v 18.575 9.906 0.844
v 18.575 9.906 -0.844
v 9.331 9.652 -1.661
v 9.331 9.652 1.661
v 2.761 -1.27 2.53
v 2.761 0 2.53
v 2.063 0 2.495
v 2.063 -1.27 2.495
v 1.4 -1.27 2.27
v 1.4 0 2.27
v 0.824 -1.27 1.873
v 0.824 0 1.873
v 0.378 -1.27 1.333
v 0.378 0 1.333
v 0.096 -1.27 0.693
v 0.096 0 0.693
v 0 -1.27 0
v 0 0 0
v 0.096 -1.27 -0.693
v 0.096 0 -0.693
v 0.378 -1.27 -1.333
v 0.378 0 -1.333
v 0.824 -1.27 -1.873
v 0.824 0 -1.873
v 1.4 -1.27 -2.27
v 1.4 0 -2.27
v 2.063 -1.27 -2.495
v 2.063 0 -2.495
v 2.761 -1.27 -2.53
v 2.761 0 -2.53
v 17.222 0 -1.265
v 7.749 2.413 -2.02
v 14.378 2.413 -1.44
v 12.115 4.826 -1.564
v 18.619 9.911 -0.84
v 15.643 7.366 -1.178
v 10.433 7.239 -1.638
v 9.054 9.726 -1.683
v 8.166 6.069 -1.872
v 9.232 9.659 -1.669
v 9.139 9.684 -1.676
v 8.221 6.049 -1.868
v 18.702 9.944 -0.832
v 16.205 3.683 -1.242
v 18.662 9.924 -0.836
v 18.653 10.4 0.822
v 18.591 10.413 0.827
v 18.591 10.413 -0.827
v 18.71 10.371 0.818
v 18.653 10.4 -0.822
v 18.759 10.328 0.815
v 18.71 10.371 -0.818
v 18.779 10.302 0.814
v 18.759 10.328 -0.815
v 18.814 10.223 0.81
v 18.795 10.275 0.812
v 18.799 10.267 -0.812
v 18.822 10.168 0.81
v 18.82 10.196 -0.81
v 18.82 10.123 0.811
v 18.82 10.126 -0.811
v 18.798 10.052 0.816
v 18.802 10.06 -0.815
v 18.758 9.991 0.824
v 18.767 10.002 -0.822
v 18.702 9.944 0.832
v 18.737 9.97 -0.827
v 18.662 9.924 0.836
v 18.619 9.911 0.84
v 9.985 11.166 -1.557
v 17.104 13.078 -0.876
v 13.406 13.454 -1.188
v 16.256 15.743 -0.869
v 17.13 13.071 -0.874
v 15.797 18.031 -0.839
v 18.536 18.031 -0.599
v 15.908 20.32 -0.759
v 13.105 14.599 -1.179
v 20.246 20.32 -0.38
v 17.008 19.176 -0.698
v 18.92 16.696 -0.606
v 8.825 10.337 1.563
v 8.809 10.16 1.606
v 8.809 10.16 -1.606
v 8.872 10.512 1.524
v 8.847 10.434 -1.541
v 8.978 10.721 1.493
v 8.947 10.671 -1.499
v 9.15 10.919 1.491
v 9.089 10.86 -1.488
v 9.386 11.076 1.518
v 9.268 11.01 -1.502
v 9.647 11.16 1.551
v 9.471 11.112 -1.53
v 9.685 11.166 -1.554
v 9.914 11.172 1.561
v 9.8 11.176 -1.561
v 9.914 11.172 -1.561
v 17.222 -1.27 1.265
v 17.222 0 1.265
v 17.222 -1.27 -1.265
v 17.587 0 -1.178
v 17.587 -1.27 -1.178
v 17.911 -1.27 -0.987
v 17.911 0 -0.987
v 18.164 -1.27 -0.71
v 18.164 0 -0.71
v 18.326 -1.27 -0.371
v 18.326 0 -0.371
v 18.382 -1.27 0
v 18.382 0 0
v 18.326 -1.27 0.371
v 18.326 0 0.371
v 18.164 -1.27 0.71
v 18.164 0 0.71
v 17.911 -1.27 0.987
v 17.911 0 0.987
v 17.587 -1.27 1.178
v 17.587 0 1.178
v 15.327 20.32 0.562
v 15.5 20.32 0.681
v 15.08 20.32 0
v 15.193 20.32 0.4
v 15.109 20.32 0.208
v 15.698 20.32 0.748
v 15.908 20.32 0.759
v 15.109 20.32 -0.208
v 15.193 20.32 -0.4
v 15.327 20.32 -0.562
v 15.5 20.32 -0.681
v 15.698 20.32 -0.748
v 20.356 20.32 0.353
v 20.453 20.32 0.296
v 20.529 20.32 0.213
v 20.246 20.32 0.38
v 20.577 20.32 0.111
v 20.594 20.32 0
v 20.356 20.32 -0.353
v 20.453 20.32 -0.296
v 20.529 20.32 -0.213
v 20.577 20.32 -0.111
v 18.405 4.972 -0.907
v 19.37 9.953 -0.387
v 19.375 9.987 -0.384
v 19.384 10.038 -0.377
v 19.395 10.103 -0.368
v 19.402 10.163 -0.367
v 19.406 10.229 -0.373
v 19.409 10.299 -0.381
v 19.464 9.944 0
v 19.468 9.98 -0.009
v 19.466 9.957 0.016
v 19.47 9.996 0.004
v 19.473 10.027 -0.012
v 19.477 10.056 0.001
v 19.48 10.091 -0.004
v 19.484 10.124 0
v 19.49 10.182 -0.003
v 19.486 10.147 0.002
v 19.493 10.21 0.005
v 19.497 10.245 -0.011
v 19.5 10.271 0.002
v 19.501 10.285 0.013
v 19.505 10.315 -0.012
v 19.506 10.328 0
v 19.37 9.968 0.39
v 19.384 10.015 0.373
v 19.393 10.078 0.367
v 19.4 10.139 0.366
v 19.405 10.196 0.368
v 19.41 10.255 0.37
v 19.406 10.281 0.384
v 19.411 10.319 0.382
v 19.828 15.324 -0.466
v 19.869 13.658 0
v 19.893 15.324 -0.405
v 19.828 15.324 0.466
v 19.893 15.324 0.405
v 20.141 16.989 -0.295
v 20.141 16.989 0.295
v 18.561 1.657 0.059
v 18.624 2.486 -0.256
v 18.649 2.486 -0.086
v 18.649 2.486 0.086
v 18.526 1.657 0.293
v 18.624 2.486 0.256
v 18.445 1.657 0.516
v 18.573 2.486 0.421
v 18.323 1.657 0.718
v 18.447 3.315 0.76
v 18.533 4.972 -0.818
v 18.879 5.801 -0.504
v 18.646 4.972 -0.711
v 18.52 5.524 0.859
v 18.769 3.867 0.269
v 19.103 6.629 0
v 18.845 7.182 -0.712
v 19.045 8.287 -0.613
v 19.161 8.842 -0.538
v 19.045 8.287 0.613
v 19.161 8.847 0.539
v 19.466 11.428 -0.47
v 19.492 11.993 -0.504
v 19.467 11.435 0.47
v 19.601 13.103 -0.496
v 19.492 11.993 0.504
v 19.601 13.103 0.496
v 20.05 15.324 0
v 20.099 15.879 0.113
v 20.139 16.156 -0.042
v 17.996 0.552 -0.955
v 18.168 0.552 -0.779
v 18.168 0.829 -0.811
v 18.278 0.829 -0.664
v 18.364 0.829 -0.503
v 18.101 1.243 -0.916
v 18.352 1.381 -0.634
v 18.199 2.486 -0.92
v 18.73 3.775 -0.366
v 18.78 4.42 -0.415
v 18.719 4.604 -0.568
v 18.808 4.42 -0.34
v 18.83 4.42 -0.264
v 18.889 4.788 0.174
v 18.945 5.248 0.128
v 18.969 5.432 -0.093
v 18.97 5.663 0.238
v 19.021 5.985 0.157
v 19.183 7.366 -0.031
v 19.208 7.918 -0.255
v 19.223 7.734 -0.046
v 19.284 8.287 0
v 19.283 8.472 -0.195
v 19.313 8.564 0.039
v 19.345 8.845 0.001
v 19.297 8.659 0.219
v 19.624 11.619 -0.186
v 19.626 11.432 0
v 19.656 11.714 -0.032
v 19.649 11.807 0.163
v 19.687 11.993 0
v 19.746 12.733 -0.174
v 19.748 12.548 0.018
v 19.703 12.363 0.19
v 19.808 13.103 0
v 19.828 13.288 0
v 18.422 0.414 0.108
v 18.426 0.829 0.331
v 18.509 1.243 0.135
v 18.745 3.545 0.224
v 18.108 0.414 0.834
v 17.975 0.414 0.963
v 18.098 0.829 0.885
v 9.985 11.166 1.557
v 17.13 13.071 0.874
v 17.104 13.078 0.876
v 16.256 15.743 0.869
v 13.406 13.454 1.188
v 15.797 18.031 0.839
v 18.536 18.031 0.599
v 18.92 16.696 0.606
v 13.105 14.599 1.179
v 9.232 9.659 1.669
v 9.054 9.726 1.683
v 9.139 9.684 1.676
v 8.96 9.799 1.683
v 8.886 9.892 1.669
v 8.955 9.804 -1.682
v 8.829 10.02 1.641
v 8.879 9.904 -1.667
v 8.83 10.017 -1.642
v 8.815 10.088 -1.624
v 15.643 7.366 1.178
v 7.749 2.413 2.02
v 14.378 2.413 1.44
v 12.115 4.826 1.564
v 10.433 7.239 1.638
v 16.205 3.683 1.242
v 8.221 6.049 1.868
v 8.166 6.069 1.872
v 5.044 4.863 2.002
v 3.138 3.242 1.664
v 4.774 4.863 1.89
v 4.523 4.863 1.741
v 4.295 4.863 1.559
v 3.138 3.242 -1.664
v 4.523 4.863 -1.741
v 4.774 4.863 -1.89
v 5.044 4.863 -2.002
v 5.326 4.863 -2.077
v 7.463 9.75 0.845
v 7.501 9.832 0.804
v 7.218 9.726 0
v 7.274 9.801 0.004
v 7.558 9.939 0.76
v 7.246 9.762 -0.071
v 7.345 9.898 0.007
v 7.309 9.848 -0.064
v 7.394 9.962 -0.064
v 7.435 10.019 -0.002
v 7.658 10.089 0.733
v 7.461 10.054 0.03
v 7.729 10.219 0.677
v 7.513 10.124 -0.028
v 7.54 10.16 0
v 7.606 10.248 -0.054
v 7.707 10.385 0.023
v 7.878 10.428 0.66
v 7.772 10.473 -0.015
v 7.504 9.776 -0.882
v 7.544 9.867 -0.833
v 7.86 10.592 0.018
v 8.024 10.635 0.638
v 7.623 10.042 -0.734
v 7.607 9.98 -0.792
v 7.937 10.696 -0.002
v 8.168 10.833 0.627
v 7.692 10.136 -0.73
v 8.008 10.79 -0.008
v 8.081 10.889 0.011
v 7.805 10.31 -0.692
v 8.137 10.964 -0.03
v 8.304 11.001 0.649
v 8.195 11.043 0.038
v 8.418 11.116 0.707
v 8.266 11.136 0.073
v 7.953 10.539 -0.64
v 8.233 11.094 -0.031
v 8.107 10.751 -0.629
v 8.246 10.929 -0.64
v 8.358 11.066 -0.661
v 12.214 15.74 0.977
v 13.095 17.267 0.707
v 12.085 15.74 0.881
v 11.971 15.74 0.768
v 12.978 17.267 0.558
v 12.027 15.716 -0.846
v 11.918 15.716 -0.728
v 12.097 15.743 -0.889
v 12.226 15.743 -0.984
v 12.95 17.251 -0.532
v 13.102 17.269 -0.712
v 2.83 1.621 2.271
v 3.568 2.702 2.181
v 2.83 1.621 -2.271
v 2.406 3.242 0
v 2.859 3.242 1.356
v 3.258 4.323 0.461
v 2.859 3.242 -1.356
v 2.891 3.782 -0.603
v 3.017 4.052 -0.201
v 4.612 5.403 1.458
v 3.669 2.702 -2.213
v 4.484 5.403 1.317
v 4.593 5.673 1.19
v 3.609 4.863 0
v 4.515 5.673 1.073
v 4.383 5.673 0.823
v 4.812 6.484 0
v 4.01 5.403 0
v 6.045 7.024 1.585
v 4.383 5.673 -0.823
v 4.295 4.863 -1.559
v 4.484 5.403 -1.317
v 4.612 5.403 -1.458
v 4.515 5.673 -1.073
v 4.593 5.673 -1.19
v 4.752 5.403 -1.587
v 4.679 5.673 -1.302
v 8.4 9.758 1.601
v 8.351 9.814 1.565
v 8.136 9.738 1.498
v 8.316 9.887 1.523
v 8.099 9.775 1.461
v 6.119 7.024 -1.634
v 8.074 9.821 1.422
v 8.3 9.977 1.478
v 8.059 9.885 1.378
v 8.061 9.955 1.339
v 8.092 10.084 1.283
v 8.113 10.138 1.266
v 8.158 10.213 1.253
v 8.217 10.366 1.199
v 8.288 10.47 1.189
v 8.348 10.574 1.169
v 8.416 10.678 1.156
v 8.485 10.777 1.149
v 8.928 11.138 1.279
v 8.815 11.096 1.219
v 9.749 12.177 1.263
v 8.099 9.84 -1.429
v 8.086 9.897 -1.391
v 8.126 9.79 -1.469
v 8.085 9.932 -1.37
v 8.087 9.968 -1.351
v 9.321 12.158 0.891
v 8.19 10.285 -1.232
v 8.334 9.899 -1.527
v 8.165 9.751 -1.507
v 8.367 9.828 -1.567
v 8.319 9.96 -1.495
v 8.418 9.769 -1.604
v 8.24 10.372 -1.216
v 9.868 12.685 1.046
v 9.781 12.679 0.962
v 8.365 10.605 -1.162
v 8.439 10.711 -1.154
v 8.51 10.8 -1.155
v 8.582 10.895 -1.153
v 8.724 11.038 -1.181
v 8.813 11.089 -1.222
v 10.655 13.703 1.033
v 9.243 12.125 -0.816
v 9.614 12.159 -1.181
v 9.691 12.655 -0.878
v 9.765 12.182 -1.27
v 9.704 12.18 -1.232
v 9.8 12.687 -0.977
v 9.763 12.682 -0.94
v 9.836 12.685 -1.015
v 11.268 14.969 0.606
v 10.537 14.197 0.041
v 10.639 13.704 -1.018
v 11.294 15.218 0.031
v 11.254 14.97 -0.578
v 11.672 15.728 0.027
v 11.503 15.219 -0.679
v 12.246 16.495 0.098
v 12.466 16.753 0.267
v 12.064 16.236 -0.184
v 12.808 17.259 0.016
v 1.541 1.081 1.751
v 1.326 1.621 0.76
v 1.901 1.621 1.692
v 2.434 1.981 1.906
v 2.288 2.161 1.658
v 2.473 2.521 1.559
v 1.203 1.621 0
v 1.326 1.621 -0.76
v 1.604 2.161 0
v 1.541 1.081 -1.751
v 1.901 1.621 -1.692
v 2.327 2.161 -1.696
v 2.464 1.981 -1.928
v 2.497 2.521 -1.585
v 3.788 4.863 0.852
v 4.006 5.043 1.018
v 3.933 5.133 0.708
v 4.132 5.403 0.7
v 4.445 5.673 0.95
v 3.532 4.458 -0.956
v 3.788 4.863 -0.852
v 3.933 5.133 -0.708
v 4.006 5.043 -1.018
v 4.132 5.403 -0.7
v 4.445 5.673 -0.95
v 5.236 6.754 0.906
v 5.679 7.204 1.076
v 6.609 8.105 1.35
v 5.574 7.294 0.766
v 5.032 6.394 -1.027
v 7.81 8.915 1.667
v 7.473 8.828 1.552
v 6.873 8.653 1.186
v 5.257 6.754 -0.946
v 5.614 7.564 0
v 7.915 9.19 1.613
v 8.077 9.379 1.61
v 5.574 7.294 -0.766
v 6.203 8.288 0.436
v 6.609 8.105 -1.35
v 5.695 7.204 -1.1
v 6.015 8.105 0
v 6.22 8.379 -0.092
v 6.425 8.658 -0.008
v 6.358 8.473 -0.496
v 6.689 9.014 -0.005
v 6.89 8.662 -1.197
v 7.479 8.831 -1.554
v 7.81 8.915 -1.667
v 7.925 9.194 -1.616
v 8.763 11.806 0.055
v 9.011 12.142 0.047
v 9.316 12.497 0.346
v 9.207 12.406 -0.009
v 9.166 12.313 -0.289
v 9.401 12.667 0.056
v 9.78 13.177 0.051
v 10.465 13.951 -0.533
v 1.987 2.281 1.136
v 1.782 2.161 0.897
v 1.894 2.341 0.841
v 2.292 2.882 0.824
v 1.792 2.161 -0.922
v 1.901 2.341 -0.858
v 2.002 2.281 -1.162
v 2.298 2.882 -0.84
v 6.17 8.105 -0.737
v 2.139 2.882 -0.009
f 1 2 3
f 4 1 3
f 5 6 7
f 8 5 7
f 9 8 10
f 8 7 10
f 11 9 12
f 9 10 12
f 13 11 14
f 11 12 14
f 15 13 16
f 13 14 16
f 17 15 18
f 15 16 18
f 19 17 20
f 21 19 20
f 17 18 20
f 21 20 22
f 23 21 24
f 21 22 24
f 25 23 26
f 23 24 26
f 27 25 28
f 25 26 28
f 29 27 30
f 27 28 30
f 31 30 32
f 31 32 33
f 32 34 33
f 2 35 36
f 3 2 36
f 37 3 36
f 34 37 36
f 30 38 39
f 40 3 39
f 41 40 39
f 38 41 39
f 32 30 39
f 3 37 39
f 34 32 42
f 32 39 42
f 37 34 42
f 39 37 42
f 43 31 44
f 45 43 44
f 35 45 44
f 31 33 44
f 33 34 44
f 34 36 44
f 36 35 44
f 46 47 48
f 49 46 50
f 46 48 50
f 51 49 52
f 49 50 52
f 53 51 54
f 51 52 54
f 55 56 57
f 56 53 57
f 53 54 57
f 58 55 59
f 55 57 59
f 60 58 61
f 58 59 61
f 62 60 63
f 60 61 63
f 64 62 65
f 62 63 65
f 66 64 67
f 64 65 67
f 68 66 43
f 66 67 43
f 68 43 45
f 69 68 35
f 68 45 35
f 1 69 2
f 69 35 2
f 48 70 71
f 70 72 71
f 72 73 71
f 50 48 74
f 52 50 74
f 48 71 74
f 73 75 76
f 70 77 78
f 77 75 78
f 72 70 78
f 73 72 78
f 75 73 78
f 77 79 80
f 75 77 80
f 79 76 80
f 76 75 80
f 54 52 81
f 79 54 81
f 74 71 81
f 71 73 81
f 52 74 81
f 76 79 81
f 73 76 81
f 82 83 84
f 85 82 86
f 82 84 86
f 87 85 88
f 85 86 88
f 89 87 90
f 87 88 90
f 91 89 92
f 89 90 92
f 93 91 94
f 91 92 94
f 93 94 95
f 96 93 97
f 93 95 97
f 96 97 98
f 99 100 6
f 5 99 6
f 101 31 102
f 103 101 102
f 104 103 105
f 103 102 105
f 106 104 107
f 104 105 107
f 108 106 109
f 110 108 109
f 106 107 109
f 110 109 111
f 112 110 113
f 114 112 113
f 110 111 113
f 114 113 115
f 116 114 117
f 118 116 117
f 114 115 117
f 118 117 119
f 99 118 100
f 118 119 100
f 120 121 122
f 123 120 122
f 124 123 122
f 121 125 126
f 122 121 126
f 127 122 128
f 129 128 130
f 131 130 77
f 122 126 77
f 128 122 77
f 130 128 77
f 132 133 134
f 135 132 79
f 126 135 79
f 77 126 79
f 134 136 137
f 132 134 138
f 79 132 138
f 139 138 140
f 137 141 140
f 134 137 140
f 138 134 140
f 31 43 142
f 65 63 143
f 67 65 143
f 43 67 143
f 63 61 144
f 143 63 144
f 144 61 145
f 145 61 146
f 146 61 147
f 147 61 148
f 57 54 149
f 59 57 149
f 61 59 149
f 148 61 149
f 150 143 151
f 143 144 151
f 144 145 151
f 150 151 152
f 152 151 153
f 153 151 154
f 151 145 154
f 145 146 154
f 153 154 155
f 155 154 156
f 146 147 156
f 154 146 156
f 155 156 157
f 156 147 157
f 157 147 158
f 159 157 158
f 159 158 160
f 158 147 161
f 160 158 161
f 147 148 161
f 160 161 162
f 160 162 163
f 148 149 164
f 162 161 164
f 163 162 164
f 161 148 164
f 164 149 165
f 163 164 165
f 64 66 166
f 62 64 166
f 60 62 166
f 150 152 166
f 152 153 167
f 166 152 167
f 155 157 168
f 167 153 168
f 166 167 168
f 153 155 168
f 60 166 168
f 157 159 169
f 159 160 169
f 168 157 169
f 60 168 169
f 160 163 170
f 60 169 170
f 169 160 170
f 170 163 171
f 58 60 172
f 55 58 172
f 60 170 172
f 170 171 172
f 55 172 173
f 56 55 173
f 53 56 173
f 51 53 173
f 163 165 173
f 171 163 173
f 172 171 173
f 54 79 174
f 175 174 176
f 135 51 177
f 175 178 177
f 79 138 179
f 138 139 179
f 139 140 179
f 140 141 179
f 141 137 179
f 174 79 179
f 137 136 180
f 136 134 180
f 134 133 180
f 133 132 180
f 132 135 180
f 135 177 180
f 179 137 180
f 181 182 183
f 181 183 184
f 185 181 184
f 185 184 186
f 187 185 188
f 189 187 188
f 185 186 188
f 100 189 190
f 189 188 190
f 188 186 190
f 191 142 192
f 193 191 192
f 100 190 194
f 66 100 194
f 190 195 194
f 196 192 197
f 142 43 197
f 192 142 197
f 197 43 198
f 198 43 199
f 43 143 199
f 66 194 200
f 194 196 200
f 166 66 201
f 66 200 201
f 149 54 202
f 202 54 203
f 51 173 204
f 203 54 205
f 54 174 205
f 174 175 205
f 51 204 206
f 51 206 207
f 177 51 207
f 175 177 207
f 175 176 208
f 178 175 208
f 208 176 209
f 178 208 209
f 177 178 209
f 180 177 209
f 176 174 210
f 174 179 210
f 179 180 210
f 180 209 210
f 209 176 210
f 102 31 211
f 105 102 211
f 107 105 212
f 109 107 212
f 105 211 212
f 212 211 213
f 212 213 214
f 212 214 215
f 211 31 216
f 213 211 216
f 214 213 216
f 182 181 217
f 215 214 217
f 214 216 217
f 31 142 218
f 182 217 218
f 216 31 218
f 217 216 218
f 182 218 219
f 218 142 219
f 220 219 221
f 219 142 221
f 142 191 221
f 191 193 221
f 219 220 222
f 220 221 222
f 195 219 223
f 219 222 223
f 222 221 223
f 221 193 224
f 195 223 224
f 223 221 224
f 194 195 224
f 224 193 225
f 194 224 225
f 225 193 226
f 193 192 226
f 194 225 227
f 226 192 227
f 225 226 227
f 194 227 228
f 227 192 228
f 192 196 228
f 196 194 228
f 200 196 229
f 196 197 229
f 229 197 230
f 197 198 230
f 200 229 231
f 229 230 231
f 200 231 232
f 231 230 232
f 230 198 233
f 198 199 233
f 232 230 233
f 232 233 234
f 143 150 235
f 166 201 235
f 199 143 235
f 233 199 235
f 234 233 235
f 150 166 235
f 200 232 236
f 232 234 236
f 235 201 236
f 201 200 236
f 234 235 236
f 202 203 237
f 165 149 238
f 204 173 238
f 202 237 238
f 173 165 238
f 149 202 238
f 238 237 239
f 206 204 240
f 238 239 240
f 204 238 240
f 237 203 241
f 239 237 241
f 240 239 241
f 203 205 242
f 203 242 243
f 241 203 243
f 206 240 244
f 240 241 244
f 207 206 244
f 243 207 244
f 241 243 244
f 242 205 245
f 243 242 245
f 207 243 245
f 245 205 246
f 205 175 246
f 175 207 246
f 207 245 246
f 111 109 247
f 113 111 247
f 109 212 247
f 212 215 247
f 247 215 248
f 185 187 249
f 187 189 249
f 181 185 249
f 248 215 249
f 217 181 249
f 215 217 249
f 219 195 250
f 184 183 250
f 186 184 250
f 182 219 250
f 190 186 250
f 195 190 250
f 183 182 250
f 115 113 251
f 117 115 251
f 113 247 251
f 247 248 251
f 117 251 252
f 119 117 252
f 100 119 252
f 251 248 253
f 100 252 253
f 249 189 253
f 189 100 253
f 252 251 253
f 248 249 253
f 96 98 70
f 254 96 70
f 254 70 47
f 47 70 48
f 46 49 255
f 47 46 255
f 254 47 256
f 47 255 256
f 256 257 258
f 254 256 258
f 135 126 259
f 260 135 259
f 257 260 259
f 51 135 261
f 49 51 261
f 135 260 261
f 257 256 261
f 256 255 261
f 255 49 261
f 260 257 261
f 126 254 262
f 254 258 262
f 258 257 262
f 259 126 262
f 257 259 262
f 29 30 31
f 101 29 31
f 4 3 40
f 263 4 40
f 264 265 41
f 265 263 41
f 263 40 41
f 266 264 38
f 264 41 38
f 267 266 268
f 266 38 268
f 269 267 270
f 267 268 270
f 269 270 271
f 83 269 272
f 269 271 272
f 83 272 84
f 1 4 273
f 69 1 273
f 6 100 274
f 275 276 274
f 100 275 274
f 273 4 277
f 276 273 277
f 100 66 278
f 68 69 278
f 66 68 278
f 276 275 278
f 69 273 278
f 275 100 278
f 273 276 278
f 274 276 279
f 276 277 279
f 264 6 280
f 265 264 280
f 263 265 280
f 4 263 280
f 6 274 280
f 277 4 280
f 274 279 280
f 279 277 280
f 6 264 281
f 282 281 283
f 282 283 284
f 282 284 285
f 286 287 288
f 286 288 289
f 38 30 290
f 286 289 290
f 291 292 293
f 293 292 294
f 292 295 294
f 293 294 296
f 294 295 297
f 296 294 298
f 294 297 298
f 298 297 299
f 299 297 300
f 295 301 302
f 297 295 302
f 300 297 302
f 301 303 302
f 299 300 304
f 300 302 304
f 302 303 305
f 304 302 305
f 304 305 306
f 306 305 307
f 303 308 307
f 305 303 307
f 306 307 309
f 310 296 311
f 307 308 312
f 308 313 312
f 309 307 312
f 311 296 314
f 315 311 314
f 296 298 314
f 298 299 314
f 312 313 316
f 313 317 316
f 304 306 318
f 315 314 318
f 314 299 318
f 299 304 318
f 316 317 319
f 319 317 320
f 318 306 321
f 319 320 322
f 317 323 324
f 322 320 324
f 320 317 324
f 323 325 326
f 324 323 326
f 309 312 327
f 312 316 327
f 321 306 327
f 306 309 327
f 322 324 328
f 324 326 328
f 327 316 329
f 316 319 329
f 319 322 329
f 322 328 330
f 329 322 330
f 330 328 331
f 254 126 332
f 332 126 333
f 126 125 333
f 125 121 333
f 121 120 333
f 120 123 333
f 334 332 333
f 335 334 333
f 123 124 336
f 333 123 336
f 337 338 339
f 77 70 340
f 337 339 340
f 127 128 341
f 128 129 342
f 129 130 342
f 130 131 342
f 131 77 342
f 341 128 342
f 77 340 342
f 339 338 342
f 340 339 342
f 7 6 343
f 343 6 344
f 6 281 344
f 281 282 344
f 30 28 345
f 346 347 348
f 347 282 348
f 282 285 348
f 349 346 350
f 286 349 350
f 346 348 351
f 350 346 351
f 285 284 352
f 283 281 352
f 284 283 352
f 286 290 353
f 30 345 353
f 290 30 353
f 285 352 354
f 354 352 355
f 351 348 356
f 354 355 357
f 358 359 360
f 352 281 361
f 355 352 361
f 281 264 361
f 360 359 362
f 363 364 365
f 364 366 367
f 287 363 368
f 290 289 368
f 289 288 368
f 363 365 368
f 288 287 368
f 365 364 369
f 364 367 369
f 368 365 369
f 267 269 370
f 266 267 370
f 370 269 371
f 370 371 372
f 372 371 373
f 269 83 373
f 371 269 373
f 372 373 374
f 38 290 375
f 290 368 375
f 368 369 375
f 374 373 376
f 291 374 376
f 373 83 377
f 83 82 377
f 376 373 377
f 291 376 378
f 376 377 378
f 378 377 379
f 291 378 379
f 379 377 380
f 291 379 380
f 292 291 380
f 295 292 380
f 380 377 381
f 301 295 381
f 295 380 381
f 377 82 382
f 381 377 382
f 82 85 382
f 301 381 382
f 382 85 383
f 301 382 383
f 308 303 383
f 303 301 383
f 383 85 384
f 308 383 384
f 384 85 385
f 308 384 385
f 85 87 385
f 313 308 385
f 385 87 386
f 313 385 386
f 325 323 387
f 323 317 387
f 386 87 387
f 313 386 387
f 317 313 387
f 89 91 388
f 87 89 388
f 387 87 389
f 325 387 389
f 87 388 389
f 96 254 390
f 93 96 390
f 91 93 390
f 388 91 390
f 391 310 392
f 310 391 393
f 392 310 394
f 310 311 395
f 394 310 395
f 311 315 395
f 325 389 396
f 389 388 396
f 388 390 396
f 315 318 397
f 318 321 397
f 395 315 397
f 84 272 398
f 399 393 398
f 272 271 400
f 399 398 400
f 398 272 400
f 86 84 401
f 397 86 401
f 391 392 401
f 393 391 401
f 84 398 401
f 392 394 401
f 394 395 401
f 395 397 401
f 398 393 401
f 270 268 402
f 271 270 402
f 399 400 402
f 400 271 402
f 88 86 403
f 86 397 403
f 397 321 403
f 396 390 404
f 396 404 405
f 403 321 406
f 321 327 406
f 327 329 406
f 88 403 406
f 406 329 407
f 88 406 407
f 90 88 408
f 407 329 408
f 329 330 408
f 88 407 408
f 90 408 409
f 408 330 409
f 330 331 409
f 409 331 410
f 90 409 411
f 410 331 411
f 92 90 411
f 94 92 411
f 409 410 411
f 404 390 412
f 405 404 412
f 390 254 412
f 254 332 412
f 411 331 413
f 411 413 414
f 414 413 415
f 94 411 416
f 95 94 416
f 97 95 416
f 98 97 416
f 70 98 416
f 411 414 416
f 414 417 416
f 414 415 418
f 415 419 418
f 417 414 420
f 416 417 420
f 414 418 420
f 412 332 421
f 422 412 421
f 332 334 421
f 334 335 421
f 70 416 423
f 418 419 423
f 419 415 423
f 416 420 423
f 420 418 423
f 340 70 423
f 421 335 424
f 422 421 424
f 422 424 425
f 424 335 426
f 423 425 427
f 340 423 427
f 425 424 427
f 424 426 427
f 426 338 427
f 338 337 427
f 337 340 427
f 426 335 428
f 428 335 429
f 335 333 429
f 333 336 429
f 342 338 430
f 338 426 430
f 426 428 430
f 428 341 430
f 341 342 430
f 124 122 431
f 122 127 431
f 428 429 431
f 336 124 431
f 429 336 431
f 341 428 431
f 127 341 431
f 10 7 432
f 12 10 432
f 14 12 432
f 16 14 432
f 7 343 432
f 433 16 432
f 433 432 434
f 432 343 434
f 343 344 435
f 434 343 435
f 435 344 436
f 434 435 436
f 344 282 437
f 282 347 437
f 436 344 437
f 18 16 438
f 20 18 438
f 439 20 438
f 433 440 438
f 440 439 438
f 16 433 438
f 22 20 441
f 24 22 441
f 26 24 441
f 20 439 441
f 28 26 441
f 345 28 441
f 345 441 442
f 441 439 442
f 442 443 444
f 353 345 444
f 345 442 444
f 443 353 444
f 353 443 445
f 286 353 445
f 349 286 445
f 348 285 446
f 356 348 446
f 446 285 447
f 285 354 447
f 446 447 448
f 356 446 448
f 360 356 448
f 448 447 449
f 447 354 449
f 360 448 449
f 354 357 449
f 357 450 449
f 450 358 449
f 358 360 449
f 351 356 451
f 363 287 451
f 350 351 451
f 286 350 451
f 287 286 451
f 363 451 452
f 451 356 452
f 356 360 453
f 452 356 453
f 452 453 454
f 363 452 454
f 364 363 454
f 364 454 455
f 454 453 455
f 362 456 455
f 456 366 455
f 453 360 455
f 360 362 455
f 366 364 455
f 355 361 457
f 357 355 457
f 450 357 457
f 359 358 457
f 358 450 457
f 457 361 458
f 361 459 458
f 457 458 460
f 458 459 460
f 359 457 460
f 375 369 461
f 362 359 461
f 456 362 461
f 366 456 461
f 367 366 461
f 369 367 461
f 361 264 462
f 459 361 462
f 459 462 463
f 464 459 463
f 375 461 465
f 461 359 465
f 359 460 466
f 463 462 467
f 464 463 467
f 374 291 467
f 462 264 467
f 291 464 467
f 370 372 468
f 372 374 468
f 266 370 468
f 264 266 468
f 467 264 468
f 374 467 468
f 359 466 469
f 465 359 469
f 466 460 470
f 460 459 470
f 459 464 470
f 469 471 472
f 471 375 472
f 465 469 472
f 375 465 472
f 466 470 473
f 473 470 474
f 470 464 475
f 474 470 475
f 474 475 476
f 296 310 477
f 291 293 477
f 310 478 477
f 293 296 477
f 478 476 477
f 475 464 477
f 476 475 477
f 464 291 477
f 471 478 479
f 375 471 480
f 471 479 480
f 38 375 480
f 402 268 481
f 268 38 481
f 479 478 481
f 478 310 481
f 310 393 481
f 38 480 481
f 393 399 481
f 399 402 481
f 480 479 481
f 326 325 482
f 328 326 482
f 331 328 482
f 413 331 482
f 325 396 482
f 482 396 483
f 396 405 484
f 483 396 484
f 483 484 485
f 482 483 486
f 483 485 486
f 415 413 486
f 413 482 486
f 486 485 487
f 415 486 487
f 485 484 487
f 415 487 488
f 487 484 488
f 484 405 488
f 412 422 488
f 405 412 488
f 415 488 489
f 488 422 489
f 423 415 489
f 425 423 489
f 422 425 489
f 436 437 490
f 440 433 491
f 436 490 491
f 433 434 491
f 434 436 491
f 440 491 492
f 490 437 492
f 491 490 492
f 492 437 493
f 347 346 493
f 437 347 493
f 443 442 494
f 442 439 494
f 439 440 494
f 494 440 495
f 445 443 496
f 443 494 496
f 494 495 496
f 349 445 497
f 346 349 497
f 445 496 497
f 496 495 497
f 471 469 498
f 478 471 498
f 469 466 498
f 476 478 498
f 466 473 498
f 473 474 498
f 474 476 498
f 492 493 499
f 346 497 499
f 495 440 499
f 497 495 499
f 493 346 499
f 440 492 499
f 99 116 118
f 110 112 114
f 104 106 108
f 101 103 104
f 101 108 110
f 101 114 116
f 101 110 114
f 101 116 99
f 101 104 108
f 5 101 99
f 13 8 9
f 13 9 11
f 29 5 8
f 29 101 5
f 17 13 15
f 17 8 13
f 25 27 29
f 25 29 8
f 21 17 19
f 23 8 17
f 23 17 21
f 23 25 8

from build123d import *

# Parameters (mm, degrees)
BOSS_EXTRUDE1_DEPTH     = 1.27
CUT_EXTRUDE1_DEPTH      = 30.042571975
CUT_EXTRUDE1_DEPTH_BACK = 30.042571975


with BuildPart() as part:
    # Sketch1 → Boss-Extrude1 (new body)
    with BuildSketch(Plane(origin=(0, 0, 0), x_dir=(1, 0, 0), z_dir=(0, 1, 0))):
        with BuildLine():
            Line((2.761375587, 2.530334533), (17.222303615, 1.265167267))
            ThreePointArc((17.222303615, 1.265167267), (18.381615822, 0), (17.222303615, -1.265167267))
            Line((17.222303615, -1.265167267), (2.761375587, -2.530334533))
            ThreePointArc((2.761375587, -2.530334533), (0, 0), (2.761375587, 2.530334533))
        make_face()
    extrude(amount=-BOSS_EXTRUDE1_DEPTH)

    # Sketch1<3> → Loft2 section 0
    with BuildSketch(Plane(origin=(0, 0, 0), x_dir=(1, 0, 0), z_dir=(0, 1, 0))):
        with BuildLine():
            Line((2.761375587, 2.530334533), (17.222303615, 1.265167267))
            ThreePointArc((17.222303615, 1.265167267), (18.381615822, 0), (17.222303615, -1.265167267))
            Line((17.222303615, -1.265167267), (2.761375587, -2.530334533))
            ThreePointArc((2.761375587, -2.530334533), (0, 0), (2.761375587, 2.530334533))
        make_face()
    # Sketch5 → Loft2 section 1
    with BuildSketch(Plane(origin=(0, 20.32, 0), x_dir=(1, 0, 0), z_dir=(0, 1, 0))):
        with BuildLine():
            Line((15.908028498, 0.75910036), (20.246306907, 0.37955018))
            ThreePointArc((20.246306907, 0.37955018), (20.594100569, 0), (20.246306907, -0.37955018))
            Line((20.246306907, -0.37955018), (15.908028498, -0.75910036))
            ThreePointArc((15.908028498, -0.75910036), (15.079615822, 0), (15.908028498, 0.75910036))
        make_face()
    loft()

    # Sketch7 → Cut-Extrude1 (cut, two sides: drawn at the far end of the back side and taken through both)
    with BuildSketch(Plane.XY.offset(-CUT_EXTRUDE1_DEPTH_BACK)):
        with BuildLine():
            Line((9.913963672, 11.172133813), (18.59052049, 10.413033453))
            ThreePointArc((18.59052049, 10.413033453), (18.822269376, 10.152405715), (18.575356903, 9.906095759))
            Line((18.575356903, 9.906095759), (9.331361381, 9.652191518))
            ThreePointArc((9.331361381, 9.652191518), (8.963168858, 9.795891805), (8.809413438, 10.16))
            ThreePointArc((8.809413438, 10.16), (9.139013787, 10.909073774), (9.913963672, 11.172133813))
        make_face()
    extrude(amount=CUT_EXTRUDE1_DEPTH + CUT_EXTRUDE1_DEPTH_BACK, mode=Mode.SUBTRACT)


solid = part.part
